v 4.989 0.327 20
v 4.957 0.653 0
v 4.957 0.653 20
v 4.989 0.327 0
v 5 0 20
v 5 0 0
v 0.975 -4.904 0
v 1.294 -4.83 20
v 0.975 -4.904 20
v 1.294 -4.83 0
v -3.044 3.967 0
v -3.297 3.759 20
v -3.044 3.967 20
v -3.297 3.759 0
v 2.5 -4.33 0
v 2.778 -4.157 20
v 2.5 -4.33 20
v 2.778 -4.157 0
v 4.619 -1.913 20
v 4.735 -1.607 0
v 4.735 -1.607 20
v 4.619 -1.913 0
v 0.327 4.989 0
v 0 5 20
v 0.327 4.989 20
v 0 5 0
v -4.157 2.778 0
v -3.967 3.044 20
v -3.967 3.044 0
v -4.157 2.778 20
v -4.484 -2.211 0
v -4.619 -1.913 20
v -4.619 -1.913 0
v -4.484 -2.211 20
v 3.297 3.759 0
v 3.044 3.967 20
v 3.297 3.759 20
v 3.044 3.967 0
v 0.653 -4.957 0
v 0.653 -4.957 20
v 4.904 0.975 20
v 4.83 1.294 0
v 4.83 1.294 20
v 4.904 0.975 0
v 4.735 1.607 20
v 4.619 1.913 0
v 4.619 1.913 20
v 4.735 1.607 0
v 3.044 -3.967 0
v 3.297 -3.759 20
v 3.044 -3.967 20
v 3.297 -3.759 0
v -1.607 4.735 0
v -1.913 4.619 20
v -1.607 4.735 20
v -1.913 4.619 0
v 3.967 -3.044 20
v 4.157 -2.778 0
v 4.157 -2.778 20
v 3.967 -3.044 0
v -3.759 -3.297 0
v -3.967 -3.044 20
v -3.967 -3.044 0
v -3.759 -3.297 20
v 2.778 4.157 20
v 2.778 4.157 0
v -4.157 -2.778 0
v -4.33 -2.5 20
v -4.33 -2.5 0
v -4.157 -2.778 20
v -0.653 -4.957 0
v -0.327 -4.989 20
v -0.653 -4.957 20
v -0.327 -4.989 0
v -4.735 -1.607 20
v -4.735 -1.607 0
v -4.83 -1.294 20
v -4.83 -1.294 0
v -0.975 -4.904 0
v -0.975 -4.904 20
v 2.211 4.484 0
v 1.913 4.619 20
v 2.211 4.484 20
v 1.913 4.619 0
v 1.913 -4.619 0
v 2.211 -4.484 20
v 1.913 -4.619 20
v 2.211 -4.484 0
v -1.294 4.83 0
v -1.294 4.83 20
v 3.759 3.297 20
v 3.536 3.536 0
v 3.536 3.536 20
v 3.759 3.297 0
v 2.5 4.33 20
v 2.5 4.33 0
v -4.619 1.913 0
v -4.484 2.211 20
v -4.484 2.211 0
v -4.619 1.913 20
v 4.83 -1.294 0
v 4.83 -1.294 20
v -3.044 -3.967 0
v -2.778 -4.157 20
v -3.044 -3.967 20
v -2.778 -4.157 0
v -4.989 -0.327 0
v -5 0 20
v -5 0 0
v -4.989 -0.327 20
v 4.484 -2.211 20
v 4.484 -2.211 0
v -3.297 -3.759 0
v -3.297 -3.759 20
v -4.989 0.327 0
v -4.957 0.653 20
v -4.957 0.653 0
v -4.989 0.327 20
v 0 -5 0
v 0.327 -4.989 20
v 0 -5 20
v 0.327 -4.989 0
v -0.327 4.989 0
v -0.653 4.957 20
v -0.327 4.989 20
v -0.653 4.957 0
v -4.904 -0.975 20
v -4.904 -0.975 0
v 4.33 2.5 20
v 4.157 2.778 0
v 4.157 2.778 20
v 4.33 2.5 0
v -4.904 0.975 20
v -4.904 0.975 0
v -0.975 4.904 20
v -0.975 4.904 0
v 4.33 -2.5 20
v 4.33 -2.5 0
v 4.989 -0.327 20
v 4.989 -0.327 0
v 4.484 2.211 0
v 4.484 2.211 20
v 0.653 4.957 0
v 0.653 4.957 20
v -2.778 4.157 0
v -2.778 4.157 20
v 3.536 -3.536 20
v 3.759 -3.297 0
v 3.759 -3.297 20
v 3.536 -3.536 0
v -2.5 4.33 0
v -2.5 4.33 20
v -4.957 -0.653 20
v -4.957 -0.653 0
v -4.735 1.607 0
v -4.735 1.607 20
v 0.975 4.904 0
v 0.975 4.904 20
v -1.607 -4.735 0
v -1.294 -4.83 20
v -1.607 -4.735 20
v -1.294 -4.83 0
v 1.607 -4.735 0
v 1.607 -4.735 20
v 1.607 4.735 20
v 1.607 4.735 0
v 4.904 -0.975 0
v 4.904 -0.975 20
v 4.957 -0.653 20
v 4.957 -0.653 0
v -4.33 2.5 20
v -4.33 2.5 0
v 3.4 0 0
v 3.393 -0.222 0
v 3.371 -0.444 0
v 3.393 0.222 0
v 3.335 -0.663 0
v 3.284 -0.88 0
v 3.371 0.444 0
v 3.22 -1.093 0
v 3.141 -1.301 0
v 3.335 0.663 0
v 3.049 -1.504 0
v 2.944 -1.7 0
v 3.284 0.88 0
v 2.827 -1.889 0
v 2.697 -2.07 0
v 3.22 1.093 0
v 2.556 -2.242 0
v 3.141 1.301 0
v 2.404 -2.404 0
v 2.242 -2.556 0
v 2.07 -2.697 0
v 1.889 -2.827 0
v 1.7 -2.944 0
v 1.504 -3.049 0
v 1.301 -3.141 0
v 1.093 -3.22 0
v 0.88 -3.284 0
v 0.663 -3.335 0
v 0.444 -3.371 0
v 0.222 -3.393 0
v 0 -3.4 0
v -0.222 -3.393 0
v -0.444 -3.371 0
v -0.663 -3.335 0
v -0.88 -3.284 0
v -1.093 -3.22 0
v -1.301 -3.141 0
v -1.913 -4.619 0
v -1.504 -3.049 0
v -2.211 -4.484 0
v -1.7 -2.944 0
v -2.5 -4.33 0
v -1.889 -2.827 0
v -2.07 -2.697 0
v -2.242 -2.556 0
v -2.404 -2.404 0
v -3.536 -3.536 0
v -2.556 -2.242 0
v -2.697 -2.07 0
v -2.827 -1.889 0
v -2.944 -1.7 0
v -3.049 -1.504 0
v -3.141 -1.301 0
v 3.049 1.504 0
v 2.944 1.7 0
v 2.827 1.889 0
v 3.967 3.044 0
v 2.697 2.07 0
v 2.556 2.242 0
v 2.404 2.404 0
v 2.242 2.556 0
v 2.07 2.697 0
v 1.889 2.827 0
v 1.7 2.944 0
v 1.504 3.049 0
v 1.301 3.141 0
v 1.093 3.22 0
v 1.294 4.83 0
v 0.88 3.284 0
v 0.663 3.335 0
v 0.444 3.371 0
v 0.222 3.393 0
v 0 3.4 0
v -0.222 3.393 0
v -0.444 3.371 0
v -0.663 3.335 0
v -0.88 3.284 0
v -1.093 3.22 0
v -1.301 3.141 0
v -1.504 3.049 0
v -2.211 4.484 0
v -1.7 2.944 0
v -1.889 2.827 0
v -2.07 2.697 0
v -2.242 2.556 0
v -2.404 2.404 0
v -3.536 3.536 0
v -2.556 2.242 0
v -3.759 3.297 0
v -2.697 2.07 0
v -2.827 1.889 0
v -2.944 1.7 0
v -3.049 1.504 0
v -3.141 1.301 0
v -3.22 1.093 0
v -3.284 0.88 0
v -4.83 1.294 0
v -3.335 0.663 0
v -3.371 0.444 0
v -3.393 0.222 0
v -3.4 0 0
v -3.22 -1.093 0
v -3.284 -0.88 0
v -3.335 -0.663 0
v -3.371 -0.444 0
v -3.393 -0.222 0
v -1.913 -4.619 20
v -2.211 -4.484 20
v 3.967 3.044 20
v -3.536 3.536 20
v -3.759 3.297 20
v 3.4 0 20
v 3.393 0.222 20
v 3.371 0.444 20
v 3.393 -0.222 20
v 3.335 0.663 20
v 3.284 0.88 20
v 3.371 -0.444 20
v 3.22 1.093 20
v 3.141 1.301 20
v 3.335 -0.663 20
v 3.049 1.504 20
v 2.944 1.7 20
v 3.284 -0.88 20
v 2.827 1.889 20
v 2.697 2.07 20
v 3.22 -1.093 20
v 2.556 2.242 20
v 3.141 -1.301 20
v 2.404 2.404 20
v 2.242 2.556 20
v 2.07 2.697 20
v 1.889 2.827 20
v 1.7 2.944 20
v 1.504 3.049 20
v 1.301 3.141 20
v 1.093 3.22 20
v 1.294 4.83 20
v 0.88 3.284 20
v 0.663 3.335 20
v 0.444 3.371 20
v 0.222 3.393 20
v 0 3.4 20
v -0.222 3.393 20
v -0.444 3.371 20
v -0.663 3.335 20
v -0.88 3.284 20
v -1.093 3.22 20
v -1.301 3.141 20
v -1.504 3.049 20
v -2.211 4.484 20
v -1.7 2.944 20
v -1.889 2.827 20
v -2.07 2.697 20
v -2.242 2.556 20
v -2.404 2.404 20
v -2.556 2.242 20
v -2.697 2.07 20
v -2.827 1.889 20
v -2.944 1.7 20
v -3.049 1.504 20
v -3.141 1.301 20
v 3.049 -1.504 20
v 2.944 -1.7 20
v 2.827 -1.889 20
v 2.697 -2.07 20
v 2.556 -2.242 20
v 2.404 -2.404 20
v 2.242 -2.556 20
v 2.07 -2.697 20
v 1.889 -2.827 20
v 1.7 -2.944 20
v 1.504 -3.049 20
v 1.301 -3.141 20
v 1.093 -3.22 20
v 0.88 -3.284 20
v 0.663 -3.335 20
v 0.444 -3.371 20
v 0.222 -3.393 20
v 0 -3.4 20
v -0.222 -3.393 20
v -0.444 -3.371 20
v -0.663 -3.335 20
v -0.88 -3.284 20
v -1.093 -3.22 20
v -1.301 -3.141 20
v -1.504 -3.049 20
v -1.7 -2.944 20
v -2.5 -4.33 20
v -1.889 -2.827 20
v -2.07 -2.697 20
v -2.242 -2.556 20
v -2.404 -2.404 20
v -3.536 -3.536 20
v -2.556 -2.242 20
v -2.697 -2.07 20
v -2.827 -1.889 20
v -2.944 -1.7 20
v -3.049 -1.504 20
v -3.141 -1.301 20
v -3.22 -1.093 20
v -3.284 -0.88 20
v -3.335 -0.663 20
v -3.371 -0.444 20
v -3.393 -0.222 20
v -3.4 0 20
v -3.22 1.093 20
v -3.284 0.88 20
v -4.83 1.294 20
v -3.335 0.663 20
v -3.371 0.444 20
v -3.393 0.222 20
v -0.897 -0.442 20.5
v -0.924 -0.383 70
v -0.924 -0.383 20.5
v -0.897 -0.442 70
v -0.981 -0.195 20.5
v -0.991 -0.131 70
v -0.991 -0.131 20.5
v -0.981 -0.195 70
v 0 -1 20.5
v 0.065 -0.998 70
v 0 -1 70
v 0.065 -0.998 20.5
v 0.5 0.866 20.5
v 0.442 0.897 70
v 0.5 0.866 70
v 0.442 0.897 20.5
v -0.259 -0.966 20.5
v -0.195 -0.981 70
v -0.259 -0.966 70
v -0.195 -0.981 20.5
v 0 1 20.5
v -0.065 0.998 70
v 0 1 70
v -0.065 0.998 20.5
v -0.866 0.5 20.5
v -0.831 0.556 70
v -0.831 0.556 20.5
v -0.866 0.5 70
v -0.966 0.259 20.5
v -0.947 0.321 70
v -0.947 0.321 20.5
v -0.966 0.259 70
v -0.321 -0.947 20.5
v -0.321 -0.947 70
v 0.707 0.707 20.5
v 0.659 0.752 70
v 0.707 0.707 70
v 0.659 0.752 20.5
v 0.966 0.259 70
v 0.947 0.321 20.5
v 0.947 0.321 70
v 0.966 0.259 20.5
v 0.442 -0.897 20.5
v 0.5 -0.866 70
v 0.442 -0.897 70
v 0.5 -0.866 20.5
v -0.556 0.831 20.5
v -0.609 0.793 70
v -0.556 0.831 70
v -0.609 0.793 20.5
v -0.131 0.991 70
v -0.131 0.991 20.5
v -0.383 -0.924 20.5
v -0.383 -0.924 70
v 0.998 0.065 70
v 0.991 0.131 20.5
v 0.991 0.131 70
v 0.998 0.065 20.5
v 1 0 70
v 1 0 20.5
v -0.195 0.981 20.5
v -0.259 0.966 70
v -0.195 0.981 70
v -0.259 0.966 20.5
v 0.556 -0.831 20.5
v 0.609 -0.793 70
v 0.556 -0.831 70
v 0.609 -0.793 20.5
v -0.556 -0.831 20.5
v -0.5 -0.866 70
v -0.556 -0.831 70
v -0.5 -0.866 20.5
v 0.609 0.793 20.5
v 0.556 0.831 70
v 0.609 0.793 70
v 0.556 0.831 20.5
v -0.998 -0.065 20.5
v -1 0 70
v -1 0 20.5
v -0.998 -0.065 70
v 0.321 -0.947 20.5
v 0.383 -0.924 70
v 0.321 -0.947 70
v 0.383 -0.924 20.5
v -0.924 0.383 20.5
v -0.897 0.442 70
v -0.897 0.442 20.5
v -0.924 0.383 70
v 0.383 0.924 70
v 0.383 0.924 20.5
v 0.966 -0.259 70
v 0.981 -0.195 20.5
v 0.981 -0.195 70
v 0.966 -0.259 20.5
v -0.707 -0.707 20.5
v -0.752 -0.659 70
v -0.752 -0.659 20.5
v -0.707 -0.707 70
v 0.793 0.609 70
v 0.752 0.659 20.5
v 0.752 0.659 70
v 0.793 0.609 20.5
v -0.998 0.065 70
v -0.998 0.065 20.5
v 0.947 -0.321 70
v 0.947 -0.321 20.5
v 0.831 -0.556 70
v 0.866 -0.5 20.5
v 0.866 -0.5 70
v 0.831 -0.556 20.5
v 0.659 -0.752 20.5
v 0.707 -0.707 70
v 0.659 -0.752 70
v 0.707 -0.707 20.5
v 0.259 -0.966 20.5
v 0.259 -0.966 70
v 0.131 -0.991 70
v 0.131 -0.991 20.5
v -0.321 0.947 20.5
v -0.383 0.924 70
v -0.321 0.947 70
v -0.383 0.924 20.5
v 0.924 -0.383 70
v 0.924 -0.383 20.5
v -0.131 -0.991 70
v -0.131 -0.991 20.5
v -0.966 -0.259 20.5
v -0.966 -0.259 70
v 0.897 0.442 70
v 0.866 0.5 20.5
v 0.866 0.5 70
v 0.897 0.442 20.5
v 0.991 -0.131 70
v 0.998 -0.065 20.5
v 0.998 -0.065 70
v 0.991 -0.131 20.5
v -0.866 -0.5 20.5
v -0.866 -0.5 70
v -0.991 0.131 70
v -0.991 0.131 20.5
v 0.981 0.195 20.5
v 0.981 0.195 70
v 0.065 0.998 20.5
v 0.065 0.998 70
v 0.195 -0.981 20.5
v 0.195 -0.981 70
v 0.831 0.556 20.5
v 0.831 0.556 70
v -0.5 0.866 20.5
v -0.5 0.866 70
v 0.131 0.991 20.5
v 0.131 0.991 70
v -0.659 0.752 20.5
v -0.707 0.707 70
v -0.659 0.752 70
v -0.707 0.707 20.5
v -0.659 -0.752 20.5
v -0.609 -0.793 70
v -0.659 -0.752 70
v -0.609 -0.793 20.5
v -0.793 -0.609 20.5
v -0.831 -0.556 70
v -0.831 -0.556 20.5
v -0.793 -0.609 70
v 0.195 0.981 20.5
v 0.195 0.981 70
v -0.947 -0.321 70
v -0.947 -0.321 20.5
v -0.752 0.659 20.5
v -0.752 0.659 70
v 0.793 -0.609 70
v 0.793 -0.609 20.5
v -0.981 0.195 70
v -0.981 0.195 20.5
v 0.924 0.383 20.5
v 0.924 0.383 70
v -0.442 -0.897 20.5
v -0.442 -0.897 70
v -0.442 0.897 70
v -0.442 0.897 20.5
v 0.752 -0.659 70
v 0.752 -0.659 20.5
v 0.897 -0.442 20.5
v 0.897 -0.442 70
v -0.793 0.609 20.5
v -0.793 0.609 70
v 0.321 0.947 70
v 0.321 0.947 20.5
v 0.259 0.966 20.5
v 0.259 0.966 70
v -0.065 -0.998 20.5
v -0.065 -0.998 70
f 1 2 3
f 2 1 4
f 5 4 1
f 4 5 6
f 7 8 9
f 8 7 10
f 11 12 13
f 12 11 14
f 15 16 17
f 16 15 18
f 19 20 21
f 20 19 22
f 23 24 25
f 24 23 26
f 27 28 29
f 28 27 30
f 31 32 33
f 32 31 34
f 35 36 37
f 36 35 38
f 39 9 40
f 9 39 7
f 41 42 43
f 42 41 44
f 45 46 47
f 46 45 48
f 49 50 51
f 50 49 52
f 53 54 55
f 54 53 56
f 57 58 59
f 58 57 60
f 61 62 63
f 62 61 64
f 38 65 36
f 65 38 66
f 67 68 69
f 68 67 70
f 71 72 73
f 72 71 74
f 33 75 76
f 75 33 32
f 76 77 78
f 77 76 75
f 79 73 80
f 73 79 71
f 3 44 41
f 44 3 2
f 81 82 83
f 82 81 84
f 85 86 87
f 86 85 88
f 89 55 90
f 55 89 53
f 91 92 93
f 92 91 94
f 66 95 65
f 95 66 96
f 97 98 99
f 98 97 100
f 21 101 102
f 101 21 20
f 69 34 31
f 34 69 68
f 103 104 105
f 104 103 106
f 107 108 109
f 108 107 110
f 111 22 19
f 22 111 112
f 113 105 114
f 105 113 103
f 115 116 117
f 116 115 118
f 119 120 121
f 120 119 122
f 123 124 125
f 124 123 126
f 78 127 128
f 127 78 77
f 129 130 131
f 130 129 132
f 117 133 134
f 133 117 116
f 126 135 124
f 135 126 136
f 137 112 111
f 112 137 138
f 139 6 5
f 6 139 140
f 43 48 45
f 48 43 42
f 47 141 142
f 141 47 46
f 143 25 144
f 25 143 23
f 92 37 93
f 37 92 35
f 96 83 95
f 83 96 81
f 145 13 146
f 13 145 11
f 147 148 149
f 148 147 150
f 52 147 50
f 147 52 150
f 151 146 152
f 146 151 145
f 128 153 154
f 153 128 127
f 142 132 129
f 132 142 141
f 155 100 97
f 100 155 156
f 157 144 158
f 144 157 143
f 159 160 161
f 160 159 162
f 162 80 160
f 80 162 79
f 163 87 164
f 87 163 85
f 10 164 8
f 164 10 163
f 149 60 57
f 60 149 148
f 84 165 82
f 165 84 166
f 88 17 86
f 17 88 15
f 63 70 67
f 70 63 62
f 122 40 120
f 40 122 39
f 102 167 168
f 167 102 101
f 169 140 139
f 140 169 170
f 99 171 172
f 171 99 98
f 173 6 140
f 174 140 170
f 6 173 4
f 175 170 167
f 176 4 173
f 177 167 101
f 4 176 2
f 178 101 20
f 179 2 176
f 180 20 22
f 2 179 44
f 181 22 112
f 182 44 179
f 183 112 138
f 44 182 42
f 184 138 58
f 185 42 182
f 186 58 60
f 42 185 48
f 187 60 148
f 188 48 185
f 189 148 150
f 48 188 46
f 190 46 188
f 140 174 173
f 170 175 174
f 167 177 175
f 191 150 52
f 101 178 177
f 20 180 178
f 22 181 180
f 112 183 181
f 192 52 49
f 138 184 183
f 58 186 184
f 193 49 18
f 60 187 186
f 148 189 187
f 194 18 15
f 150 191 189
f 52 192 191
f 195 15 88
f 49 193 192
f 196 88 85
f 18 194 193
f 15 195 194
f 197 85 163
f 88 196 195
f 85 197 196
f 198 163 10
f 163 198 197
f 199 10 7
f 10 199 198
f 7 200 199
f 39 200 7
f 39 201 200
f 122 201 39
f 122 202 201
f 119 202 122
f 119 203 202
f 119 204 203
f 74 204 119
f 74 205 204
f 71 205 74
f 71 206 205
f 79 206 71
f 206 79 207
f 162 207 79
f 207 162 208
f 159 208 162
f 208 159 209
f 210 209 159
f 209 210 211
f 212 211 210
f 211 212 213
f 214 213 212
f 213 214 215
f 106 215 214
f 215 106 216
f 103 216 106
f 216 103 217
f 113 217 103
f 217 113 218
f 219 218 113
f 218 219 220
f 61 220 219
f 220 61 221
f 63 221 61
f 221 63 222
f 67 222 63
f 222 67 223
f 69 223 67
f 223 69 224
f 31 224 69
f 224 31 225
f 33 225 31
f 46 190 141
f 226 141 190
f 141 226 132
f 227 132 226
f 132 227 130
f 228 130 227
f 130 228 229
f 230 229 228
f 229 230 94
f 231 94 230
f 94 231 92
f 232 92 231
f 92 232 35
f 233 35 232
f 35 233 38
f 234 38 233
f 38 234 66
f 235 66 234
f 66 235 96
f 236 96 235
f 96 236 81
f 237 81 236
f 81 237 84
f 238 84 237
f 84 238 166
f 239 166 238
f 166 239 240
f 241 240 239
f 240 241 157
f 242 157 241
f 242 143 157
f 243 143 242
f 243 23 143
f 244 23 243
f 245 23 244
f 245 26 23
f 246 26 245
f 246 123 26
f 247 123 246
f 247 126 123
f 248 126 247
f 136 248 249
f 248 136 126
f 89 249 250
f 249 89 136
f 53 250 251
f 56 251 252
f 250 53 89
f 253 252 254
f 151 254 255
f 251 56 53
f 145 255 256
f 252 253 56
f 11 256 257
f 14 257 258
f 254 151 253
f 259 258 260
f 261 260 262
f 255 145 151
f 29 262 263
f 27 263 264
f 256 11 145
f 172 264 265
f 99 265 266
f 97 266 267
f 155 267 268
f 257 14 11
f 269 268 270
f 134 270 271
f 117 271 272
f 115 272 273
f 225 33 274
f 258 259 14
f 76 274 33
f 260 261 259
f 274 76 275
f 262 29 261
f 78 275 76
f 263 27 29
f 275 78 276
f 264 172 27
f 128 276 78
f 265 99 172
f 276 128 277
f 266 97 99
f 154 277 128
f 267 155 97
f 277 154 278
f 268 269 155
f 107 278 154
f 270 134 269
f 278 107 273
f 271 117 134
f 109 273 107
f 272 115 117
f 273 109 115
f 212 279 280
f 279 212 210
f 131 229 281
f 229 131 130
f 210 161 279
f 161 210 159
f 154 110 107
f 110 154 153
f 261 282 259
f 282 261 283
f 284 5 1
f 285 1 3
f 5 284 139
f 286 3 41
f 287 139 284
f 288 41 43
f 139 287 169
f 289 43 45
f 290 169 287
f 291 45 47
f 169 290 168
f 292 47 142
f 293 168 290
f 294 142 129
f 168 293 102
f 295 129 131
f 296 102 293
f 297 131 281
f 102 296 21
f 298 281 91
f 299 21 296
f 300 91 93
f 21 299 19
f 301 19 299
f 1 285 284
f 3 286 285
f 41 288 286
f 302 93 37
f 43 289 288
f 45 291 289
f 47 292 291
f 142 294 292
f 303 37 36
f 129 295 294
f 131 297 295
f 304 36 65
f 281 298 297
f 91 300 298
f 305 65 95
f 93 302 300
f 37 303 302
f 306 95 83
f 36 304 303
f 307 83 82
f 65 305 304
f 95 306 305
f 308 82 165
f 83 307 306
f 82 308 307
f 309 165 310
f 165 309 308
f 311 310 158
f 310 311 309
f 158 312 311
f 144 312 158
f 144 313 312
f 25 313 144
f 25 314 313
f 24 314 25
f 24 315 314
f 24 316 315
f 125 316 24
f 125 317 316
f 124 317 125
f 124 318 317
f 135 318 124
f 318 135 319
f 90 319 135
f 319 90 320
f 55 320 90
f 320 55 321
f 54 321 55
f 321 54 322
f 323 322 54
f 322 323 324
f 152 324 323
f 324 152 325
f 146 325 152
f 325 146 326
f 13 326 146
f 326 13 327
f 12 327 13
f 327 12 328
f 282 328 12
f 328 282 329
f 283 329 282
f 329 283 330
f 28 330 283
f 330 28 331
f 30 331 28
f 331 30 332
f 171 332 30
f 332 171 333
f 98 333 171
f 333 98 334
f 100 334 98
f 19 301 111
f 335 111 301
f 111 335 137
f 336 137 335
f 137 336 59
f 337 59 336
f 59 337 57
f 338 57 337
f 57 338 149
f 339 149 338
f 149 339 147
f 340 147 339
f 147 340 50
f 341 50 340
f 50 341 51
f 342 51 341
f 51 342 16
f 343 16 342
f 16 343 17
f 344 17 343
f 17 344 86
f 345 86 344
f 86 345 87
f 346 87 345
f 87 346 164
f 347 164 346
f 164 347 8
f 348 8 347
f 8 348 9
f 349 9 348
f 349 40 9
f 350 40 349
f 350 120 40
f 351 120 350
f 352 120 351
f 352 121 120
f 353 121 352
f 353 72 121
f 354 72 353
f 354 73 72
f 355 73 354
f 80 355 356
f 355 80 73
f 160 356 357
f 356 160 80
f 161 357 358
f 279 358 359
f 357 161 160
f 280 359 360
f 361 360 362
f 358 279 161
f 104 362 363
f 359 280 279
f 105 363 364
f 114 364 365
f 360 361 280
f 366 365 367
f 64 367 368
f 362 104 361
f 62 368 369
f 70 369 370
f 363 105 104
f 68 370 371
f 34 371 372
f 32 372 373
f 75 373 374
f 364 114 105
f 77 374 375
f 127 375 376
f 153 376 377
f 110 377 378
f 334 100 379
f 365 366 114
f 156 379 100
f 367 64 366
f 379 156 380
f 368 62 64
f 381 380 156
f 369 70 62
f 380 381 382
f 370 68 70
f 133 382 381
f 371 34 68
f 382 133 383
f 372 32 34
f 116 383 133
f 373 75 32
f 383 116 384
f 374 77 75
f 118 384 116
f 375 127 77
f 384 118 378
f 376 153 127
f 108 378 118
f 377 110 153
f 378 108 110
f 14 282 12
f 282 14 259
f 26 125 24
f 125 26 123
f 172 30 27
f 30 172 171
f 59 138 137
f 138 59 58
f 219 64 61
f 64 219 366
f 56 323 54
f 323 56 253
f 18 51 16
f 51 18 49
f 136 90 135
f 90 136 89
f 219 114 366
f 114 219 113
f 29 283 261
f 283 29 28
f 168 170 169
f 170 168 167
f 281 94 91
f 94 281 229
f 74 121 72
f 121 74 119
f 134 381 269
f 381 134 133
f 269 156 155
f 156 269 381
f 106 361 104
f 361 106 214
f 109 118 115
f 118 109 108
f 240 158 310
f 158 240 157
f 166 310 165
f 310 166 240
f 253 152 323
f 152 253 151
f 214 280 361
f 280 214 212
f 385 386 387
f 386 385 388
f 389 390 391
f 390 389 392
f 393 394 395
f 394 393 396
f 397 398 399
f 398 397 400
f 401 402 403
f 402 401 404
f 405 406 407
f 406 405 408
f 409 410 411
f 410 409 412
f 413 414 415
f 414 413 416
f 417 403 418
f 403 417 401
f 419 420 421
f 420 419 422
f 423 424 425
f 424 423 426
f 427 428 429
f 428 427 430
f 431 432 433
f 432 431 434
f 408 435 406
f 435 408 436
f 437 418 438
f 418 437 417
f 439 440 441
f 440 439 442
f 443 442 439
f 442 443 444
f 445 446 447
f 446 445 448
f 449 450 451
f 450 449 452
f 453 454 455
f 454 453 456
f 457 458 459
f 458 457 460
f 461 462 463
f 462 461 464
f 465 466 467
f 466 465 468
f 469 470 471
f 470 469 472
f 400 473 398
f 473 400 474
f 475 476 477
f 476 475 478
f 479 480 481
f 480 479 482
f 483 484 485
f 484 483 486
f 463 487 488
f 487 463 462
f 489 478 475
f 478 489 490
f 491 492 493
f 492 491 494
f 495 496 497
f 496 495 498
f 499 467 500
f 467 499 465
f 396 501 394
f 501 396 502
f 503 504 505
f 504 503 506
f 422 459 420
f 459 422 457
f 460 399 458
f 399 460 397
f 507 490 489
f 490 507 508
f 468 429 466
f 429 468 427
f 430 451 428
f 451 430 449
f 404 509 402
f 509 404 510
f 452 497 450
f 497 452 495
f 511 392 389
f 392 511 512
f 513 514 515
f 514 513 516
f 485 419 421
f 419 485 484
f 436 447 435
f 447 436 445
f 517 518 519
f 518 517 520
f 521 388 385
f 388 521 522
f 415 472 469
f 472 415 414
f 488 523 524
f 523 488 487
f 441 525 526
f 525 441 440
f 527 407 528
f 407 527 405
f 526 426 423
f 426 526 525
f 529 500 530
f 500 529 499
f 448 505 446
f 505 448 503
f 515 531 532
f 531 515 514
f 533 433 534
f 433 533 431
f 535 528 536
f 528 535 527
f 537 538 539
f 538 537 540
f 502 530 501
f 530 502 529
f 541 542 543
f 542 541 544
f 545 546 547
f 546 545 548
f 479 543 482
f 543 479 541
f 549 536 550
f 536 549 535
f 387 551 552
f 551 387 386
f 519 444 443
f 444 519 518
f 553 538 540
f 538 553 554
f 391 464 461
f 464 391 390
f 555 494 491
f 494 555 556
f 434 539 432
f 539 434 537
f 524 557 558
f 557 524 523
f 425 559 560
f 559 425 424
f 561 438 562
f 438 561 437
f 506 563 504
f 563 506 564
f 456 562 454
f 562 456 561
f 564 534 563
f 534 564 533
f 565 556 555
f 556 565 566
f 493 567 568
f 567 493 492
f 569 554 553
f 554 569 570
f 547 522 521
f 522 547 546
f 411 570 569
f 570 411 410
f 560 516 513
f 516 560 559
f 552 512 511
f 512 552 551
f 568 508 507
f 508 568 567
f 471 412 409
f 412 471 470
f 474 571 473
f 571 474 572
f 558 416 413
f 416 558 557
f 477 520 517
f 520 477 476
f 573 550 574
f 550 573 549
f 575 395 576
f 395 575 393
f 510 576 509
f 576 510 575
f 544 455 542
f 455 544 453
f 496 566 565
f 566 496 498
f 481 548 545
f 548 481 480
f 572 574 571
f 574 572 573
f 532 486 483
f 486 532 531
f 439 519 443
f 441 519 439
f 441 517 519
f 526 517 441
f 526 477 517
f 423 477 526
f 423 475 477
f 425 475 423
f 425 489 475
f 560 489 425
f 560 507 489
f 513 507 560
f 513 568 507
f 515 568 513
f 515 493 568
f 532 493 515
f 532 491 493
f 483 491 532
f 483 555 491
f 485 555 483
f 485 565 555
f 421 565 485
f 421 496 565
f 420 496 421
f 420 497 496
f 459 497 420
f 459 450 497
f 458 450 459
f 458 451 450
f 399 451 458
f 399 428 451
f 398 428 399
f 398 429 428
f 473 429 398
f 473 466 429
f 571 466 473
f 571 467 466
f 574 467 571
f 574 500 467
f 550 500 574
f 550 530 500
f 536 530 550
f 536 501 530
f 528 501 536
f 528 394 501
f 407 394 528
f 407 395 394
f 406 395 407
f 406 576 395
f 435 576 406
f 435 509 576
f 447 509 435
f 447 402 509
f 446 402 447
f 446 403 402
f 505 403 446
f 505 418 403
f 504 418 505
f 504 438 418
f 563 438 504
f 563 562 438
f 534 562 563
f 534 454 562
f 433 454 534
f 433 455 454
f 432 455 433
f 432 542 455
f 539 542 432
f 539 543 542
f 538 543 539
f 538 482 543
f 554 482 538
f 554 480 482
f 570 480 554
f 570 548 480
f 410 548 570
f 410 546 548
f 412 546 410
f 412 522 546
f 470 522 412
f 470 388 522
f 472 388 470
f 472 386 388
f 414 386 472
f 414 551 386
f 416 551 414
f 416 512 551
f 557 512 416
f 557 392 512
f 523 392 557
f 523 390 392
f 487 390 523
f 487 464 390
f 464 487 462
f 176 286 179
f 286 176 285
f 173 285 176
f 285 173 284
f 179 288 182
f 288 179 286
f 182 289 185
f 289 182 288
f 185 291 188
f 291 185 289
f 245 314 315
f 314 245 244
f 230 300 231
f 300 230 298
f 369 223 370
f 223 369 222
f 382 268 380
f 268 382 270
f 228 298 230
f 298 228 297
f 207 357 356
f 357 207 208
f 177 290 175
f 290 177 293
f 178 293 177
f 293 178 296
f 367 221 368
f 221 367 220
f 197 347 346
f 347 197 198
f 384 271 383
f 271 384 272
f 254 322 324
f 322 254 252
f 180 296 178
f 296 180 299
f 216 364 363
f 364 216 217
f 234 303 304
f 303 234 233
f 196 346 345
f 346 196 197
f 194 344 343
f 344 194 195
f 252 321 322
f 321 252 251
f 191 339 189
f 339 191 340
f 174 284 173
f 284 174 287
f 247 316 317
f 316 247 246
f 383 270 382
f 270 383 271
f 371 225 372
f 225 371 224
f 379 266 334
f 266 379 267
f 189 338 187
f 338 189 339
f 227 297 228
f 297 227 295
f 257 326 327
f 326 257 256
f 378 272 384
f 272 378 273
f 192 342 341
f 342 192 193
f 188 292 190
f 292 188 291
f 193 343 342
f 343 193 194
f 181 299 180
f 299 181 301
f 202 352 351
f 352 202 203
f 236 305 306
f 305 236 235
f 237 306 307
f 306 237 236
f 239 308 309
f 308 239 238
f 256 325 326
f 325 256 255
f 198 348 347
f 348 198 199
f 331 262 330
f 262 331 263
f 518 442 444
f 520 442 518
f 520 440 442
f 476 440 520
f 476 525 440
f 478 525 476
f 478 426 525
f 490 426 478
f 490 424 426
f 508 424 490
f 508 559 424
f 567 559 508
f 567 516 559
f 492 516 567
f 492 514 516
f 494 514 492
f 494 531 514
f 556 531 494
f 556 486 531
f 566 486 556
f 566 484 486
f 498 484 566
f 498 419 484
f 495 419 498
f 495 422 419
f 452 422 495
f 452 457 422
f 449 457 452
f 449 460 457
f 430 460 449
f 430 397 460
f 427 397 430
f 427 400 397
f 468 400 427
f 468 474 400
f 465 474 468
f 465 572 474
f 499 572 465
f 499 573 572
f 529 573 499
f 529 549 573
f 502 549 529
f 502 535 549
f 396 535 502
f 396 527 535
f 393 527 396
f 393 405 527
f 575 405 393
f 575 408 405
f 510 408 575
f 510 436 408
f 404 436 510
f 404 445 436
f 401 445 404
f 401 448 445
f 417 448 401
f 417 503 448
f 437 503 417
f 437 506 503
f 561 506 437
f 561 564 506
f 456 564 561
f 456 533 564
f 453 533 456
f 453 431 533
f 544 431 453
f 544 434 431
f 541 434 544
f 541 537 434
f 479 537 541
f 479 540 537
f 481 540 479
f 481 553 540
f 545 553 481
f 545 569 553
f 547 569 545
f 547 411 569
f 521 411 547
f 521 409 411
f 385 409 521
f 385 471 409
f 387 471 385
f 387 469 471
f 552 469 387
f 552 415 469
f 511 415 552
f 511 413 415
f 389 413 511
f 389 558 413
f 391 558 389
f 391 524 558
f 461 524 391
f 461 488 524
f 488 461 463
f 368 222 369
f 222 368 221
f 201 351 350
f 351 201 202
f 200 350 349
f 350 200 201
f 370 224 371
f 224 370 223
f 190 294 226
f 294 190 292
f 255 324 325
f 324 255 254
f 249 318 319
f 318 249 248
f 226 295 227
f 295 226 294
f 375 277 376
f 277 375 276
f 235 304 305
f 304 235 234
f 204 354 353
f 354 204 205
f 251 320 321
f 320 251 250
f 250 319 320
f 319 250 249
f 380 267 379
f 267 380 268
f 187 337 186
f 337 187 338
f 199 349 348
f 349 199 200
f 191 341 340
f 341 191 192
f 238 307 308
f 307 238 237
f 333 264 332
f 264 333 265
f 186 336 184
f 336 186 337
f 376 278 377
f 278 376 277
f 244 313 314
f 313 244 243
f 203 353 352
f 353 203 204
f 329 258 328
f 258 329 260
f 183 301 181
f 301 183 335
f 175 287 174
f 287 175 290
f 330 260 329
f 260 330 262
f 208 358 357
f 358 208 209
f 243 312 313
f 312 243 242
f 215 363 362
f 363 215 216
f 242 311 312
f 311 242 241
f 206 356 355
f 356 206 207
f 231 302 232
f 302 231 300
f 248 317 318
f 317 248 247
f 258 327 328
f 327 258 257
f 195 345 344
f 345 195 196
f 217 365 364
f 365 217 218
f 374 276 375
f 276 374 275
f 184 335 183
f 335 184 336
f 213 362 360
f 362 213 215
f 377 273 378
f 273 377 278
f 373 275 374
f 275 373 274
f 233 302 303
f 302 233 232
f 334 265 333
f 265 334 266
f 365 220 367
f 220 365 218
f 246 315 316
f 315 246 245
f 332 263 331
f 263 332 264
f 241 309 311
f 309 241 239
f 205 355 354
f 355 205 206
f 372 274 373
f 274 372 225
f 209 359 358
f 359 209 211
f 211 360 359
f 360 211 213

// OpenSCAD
// Small lab funnel - printed upright, open top and bottom
// Units: mm. Wall thickness 1.6 mm throughout.

$fn = 96;

// ---- Dimensions ----
spout_od      = 10;    // spout outer diameter (z = 0 to 20)
spout_len     = 20;    // spout length (z = 0 to 20)
cone_bottom_d = 10;    // cone outer diameter at spout junction (z = 20)
cone_top_d    = 60;    // cone rim outer diameter (z = 50)
wall          = 1.6;   // wall thickness everywhere
eps           = 0.5;   // cutter overshoot past faces

// ---- Derived ----
spout_id = spout_od - 2 * wall;   // 6.8 mm bore
cone_h   = cone_top_d - cone_bottom_d; // 50 mm cone height (slope 1:1)

difference() {
    union() {
        // Spout (tube)
        cylinder(d = spout_od, h = spout_len);
        // Cone on top of spout
        translate([0, 0, spout_len])
            cylinder(d = [cone_bottom_d, cone_top_d], h = cone_h);
    }
    // Bottom outlet cutter (through spout tip)
    translate([0, 0, -eps])
        cylinder(d = spout_id, h = spout_len + 2 * eps);
    // Top rim cutter (open top, no lip)
    translate([0, 0, spout_len + cone_h])
        cylinder(d = cone_top_d - 2 * wall, h = eps);
}
